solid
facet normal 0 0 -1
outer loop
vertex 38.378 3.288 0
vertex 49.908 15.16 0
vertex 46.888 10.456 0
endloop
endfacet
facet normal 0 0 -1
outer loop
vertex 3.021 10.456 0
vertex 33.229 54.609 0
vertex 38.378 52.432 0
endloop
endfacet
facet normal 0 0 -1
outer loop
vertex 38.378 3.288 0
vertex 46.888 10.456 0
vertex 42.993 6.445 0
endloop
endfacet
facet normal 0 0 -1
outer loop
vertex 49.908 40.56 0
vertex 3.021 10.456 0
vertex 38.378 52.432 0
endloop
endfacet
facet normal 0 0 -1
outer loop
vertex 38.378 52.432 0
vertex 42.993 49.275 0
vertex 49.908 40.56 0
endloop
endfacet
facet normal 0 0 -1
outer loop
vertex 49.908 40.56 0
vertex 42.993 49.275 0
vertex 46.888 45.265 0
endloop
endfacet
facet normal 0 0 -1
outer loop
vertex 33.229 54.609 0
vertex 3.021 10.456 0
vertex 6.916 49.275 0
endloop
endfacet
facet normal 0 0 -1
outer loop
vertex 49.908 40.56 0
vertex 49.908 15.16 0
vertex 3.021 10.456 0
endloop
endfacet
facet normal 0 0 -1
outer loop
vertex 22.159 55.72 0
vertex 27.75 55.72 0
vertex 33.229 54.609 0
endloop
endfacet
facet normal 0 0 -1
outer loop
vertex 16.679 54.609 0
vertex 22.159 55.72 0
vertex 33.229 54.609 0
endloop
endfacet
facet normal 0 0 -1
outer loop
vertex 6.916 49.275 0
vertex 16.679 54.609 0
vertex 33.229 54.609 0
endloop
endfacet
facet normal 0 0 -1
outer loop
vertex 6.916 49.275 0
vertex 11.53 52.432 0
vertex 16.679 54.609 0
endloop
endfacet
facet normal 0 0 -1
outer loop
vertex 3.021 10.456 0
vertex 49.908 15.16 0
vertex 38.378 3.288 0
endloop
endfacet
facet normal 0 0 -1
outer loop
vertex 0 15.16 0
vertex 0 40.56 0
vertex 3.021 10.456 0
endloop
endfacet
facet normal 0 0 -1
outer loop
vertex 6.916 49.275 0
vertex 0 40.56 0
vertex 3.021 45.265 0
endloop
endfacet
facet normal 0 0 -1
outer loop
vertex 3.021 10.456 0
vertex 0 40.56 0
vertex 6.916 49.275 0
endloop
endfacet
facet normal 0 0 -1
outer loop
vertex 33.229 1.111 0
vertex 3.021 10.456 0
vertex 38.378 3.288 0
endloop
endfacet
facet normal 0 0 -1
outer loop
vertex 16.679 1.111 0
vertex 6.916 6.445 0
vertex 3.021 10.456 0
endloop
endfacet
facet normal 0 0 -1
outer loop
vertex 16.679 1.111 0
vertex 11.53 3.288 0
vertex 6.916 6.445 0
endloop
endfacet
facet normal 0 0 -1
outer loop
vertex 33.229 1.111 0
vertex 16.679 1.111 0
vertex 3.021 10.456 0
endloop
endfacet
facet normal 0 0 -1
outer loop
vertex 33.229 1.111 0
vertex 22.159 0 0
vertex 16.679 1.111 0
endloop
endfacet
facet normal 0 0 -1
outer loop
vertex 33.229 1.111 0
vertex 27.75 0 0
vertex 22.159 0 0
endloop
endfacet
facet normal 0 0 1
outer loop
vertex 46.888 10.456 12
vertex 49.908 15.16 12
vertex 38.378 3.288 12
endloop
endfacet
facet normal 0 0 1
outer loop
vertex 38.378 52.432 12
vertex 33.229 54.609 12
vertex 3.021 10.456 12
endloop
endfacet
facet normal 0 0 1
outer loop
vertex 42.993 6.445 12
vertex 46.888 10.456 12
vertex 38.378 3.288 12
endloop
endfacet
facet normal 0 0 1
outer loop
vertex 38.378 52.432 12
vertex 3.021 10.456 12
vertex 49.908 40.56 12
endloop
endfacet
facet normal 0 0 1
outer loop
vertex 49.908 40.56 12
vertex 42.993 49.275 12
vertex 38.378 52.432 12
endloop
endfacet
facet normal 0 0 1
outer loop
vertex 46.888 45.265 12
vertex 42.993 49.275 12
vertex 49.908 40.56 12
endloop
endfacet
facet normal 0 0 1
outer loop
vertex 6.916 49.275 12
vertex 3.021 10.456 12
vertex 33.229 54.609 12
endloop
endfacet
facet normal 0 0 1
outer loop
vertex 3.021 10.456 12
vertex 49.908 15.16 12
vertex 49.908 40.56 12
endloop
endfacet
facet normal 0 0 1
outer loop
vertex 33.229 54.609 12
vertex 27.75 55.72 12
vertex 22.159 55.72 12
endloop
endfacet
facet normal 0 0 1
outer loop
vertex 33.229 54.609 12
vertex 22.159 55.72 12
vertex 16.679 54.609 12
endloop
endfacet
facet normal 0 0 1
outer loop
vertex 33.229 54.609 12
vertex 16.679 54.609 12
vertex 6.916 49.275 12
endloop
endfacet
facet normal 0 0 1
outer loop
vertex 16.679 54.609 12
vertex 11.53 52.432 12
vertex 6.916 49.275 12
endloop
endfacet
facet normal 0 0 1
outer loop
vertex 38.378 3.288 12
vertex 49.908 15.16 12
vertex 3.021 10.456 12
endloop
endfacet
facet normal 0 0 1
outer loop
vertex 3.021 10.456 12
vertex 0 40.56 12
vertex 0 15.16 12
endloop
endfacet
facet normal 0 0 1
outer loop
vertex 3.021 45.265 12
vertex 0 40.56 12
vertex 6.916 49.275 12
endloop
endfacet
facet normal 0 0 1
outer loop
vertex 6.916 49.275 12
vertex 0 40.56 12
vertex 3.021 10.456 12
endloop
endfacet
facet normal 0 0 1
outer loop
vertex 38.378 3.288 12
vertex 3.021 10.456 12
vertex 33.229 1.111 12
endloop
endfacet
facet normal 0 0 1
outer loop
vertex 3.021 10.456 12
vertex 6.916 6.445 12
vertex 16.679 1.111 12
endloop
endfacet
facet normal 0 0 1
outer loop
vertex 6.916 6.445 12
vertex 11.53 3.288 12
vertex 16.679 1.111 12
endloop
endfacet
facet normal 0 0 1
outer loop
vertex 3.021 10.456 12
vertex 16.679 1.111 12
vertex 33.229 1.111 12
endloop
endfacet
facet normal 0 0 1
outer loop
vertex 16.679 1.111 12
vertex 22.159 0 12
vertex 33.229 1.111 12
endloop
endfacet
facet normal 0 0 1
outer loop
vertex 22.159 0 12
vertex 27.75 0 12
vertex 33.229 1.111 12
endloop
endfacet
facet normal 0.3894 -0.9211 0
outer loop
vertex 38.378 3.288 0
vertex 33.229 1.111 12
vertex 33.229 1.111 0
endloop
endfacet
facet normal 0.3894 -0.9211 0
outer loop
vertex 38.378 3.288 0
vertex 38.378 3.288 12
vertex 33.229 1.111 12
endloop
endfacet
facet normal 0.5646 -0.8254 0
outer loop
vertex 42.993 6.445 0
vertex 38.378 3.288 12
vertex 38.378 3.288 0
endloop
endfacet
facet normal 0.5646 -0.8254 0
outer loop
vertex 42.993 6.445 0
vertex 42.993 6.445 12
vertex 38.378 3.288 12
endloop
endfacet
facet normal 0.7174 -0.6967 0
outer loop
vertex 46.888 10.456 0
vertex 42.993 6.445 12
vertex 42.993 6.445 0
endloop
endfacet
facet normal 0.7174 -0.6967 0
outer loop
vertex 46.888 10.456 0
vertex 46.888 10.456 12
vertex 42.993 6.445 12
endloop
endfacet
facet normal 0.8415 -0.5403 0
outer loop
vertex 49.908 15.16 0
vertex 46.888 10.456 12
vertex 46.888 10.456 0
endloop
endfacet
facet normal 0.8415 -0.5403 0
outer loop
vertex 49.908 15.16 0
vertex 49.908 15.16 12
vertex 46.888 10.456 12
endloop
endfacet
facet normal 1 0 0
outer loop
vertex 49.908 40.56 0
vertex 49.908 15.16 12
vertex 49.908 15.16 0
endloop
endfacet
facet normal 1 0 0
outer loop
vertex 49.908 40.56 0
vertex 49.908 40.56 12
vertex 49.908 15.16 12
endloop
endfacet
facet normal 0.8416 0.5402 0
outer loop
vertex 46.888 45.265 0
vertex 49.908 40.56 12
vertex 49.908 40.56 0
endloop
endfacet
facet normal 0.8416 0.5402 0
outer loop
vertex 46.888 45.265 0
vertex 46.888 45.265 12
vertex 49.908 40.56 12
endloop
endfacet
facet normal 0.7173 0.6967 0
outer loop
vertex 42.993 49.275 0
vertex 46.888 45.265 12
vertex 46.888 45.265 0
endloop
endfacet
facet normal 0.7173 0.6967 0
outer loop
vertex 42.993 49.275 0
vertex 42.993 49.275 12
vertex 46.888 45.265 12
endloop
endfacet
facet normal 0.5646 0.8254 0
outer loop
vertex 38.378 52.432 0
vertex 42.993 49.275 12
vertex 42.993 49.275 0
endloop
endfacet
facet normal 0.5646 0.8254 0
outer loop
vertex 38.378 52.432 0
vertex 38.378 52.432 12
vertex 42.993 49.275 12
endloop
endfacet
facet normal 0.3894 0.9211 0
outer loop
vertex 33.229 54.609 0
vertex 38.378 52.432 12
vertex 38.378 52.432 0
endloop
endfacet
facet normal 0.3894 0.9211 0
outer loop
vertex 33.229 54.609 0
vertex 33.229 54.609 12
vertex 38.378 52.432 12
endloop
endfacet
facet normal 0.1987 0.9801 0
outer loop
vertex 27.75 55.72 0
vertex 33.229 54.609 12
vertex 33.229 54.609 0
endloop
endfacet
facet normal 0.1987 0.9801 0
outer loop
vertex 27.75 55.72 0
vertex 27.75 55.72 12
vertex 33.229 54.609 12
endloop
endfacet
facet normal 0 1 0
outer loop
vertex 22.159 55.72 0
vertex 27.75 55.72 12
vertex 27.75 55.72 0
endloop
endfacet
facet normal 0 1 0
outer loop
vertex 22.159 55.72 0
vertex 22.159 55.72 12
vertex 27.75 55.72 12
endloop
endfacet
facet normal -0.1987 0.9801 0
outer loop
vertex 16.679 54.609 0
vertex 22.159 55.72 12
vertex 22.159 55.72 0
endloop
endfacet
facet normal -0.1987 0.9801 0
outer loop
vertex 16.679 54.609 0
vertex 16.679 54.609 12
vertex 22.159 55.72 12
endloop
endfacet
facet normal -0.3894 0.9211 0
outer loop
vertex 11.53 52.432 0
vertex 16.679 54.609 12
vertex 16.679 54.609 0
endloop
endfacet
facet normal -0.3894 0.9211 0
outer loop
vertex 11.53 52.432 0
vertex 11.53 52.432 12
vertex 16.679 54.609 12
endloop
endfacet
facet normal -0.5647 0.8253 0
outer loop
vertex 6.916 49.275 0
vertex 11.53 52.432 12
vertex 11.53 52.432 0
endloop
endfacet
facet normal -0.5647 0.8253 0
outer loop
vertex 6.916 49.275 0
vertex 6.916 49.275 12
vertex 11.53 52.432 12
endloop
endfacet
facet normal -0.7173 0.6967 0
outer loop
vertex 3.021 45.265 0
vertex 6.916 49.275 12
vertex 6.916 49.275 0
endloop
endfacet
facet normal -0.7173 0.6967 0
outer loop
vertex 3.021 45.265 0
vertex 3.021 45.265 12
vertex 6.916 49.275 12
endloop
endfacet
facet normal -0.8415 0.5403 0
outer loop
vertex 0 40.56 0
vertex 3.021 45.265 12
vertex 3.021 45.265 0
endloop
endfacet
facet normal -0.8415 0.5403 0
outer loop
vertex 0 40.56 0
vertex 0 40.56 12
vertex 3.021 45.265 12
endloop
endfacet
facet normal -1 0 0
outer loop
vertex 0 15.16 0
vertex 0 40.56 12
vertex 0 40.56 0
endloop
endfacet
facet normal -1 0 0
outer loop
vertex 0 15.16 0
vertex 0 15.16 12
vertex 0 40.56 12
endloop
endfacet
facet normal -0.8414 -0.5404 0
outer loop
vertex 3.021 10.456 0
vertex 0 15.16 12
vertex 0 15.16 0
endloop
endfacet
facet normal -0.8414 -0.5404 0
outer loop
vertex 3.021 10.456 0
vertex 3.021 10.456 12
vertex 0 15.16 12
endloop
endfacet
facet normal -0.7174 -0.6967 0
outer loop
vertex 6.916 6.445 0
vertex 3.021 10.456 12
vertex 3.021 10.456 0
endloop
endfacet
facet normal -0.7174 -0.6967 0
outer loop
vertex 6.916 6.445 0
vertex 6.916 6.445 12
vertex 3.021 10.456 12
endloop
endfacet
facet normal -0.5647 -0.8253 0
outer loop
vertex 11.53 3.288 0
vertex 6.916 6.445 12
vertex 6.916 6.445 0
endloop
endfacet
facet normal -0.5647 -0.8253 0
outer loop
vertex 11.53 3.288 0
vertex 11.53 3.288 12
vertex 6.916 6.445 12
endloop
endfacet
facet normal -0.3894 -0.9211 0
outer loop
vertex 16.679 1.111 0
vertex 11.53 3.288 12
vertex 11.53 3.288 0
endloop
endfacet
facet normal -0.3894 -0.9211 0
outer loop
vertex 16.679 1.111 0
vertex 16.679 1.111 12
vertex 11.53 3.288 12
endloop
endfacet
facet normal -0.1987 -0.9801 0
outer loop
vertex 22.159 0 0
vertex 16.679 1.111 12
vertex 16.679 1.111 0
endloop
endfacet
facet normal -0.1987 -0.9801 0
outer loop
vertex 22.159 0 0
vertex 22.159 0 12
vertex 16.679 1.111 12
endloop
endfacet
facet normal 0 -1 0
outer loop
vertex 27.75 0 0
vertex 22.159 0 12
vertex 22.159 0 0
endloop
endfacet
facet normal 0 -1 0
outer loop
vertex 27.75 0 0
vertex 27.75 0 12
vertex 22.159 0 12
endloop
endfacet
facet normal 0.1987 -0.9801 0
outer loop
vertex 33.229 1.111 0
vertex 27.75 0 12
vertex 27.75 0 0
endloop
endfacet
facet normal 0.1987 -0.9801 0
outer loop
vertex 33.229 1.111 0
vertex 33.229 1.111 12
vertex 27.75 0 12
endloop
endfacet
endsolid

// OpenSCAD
$fn = 32;

// ----------------------------------------------------------------------
// Flat adaptor: double_d, 12 mm thick
// ----------------------------------------------------------------------

// --- parameters (mm) ---
profile_height = 12;      // extrusion height
profile_points = 24;      // points of the closed outline

profile = [[49.908, 40.56], [46.888, 45.265], [42.993, 49.275], [38.378, 52.432], [33.229, 54.609], [27.75, 55.72], [22.159, 55.72], [16.679, 54.609], [11.53, 52.432], [6.916, 49.275], [3.021, 45.265], [0, 40.56], [0, 15.16], [3.021, 10.456], [6.916, 6.445], [11.53, 3.288], [16.679, 1.111], [22.159, 0], [27.75, 0], [33.229, 1.111], [38.378, 3.288], [42.993, 6.445], [46.888, 10.456], [49.908, 15.16]];  // single closed polygon, 24 points, counter clockwise

// --- the one profile operation ---
linear_extrude(height = profile_height) polygon(points = profile);
